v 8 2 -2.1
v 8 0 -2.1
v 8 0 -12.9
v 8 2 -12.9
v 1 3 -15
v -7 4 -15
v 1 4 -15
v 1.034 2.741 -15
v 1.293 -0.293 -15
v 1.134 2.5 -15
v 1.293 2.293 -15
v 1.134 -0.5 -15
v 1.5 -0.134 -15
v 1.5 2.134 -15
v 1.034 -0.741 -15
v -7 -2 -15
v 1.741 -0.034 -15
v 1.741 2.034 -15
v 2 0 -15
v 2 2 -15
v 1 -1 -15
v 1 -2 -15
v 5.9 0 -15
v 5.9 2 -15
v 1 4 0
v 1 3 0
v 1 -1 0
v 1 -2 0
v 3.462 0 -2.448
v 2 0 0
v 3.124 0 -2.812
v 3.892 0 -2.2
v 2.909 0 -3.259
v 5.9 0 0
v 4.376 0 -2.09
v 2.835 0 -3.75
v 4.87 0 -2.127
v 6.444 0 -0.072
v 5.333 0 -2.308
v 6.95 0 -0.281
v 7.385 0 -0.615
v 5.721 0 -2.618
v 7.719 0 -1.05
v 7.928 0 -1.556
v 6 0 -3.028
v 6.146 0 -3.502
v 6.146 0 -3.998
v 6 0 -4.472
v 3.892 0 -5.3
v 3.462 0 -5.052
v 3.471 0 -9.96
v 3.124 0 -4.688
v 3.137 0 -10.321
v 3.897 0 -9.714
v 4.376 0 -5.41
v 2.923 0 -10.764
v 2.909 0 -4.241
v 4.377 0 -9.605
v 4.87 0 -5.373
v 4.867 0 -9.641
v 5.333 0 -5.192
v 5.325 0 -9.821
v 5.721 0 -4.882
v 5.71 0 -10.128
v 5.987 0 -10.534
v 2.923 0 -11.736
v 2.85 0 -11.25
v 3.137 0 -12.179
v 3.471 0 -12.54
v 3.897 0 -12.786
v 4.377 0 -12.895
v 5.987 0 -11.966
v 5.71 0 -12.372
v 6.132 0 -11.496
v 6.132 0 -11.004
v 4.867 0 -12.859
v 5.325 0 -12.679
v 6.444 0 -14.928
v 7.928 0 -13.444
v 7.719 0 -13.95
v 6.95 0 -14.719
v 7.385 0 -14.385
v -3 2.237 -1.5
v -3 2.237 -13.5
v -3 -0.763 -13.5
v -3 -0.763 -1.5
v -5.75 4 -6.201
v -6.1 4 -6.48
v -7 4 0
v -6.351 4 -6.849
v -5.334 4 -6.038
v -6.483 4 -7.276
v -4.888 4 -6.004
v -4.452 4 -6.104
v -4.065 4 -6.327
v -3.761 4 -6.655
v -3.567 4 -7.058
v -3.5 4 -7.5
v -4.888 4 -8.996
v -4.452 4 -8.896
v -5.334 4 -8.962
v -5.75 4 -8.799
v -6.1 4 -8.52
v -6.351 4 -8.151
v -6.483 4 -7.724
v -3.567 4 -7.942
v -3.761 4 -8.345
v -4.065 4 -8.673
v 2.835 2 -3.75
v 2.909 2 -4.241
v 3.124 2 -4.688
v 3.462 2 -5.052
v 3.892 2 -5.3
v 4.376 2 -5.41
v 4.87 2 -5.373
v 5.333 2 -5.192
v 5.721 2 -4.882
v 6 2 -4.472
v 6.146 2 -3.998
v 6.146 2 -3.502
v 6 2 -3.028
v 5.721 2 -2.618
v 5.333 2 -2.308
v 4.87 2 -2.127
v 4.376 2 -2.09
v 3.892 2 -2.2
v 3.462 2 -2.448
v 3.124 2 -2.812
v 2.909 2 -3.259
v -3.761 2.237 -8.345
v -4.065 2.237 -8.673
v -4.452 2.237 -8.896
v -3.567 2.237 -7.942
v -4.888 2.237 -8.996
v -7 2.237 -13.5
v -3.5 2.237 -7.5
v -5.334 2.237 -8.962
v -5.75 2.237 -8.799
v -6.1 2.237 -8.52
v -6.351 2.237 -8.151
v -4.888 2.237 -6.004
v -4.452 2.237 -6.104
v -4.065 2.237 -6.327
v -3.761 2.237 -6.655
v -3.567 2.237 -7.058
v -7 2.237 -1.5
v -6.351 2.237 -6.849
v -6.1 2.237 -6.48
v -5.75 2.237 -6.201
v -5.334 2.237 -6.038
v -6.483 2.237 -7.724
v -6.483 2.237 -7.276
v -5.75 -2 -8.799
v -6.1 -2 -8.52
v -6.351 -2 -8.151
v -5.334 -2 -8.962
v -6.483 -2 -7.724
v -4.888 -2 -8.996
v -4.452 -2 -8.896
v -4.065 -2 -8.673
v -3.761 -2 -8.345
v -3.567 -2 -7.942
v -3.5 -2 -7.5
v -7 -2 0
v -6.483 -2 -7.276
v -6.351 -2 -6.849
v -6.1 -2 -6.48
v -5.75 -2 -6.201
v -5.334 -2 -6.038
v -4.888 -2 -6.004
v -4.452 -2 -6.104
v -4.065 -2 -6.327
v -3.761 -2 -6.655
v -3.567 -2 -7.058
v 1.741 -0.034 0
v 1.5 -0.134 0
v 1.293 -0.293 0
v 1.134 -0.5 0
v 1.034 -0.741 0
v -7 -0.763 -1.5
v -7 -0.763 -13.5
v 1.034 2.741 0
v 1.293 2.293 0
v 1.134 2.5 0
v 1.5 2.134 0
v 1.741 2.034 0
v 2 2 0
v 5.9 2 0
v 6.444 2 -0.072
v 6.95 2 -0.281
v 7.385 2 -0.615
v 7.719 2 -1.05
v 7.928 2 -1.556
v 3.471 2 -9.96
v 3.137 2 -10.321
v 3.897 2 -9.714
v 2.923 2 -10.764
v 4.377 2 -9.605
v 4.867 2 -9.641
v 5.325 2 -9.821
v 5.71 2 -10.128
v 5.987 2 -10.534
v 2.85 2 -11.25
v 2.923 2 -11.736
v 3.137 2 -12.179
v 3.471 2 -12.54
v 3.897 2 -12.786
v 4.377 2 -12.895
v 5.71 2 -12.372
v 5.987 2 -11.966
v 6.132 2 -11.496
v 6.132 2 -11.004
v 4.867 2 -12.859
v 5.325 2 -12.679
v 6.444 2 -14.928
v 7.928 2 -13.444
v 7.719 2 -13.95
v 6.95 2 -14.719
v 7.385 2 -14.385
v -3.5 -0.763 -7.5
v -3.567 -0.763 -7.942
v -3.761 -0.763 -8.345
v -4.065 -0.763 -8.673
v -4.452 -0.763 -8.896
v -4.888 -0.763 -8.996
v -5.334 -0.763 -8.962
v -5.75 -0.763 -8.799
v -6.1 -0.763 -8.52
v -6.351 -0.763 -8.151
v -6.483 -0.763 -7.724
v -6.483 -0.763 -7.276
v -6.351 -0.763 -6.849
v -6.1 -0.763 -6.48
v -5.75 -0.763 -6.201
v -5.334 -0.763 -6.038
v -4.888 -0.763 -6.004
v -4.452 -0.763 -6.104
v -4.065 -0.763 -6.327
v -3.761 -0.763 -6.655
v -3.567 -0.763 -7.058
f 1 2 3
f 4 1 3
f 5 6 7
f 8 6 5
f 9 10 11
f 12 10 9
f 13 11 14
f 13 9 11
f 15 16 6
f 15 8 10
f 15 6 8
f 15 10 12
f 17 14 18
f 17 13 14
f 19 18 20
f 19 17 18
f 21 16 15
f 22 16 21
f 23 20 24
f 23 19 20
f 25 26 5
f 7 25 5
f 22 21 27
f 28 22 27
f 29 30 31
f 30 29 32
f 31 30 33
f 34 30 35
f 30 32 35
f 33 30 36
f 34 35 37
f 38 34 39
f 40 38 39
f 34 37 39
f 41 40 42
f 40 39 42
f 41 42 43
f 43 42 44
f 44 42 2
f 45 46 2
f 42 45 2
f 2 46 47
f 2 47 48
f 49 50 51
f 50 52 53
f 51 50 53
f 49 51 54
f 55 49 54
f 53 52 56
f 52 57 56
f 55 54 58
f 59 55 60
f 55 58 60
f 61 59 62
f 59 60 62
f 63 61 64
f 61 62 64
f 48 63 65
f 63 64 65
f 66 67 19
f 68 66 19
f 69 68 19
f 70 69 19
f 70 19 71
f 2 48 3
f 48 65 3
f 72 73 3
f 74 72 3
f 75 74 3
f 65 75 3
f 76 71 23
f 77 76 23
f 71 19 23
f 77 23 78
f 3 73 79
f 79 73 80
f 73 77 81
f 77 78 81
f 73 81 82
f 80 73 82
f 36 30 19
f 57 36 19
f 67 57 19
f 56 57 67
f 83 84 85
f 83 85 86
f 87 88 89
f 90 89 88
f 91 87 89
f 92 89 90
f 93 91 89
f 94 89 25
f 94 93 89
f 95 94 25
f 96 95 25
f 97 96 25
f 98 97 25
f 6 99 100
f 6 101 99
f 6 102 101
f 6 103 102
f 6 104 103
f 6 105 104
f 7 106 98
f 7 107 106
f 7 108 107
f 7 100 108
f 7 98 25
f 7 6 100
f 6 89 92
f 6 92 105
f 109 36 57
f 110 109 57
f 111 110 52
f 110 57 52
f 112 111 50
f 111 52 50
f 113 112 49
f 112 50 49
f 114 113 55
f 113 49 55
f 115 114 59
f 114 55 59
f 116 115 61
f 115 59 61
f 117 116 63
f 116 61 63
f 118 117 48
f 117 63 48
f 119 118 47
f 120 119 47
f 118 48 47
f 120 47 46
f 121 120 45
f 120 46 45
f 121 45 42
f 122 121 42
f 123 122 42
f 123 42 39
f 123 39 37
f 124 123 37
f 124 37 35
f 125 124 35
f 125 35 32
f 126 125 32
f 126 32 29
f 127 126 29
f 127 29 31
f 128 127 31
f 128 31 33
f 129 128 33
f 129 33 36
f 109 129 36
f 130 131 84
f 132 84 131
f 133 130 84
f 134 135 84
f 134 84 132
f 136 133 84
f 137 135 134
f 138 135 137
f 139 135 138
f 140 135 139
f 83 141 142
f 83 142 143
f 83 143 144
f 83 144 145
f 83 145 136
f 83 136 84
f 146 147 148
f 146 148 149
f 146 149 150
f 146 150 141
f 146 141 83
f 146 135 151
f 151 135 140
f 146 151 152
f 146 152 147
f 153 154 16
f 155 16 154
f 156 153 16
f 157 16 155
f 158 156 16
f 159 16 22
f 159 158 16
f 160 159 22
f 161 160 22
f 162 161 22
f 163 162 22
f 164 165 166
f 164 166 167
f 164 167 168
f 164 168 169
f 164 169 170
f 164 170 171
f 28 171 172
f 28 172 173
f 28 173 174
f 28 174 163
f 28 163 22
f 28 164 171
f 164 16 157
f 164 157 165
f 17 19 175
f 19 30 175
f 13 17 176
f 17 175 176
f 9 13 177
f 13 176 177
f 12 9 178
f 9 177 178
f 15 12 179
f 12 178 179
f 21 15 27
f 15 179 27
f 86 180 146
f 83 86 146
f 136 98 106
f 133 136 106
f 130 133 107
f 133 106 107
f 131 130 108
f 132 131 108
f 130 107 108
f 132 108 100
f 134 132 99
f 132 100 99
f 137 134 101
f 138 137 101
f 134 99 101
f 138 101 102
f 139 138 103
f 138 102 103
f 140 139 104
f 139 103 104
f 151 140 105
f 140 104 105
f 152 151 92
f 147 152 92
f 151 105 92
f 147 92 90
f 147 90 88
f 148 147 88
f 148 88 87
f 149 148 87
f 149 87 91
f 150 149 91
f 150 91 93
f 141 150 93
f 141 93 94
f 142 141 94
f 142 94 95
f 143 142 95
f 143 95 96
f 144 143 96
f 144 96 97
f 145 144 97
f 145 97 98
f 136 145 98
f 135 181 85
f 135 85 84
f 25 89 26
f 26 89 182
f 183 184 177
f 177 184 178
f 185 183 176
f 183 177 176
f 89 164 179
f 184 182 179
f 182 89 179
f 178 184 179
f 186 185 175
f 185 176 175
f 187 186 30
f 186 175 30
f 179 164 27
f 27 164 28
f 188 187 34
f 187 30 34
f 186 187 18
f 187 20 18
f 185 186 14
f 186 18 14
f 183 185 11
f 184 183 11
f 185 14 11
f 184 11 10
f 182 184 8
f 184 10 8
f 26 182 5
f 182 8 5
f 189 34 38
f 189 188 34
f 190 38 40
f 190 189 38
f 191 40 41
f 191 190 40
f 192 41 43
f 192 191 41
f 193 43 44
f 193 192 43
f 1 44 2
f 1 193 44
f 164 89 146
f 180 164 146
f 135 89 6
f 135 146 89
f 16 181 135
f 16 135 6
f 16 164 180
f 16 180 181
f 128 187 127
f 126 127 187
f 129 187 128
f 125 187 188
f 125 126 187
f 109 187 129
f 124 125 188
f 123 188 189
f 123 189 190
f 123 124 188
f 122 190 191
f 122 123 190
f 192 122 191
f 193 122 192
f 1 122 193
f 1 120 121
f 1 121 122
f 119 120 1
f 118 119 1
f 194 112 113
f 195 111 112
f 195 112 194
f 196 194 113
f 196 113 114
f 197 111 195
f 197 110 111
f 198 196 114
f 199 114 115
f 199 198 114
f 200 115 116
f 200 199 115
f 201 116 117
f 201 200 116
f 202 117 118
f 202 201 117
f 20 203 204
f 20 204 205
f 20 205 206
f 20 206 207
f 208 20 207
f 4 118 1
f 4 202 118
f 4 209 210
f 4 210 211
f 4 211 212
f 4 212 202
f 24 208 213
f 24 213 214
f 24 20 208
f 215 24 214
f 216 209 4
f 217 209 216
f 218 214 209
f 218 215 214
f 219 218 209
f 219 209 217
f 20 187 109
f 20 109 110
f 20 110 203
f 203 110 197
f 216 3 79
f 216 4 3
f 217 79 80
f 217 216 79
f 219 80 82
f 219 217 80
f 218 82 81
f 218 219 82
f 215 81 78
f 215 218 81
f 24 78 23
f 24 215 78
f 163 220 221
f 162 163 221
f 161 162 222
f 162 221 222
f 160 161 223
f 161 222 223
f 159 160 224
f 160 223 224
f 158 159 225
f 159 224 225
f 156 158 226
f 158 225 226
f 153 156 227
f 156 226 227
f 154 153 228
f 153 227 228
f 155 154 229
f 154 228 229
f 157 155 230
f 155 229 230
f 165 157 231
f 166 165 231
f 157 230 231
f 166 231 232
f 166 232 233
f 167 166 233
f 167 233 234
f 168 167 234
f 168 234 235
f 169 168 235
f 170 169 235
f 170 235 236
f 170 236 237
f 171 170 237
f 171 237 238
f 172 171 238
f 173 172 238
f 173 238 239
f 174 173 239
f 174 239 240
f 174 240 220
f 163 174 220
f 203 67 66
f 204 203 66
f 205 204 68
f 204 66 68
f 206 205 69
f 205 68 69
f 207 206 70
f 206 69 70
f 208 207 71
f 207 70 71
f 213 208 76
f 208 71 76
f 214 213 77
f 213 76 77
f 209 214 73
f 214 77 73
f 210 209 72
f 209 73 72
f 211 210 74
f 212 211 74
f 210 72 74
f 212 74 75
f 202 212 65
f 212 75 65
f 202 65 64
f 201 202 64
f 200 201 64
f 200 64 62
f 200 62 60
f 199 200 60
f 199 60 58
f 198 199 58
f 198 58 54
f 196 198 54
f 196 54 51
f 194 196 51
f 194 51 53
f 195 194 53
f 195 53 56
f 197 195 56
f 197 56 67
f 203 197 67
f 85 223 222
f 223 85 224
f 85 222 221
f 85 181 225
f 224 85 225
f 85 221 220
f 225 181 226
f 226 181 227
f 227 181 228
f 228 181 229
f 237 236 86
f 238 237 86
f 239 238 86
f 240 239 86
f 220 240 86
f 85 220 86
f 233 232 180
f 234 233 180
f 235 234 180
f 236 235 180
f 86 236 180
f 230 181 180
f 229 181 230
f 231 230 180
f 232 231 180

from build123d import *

# Parameters (mm, degrees)
SKETCH1_W           = 7
SKETCH1_H           = 15
SKETCH1_W_2         = 8
BOSS_EXTRUDE1_DEPTH = 2
SKETCH2_W           = 8
SKETCH2_H           = 15
BOSS_EXTRUDE2_DEPTH = 2
SKETCH3_W           = 8
SKETCH3_H           = 15
BOSS_EXTRUDE4_DEPTH = 2
SKETCH4_R           = 1.665
SKETCH4_R_2         = 1.65
CUT_EXTRUDE1_DEPTH  = 9
FILLET1_R           = 2.1
FILLET2_R           = 2.1
SKETCH5_W           = 12
SKETCH5_H           = 3
CUT_EXTRUDE2_DEPTH  = 3.8
SKETCH6_R           = 1.5
CUT_EXTRUDE3_DEPTH  = 17.2
FILLET3_R           = 1
FILLET4_R           = 1
SKETCH7_W           = 12
SKETCH7_H           = 3
CUT_EXTRUDE4_DEPTH  = 0.2


with BuildPart() as part:
    # Sketch1 → Boss-Extrude1 (new body)
    with BuildSketch(Plane(origin=(0, 0, 0), x_dir=(1, 0, 0), z_dir=(0, 1, 0))):
        with Locations((-3.5, 7.5)):
            Rectangle(SKETCH1_W, SKETCH1_H)
        with Locations((4, 7.5)):
            Rectangle(SKETCH1_W_2, SKETCH1_H)
    extrude(amount=BOSS_EXTRUDE1_DEPTH)

    # Sketch2 → Boss-Extrude2 (add)
    with BuildSketch(Plane.XZ):
        with Locations((-3, -7.5)):
            Rectangle(SKETCH2_W, SKETCH2_H)
    extrude(amount=BOSS_EXTRUDE2_DEPTH)

    # Sketch3 → Boss-Extrude4 (add)
    with BuildSketch(Plane(origin=(0, 2, 0), x_dir=(1, 0, 0), z_dir=(0, 1, 0))):
        with Locations((-3, 7.5)):
            Rectangle(SKETCH3_W, SKETCH3_H)
    extrude(amount=BOSS_EXTRUDE4_DEPTH)

    # Sketch4 → Cut-Extrude1 (cut)
    with BuildSketch(Plane(origin=(0, 0, 0), x_dir=(-1, 0, 0), z_dir=(0, -1, 0))):
        with Locations((-4.5, 3.75)):
            Circle(SKETCH4_R)
        with Locations((-4.5, 11.25)):
            Circle(SKETCH4_R_2)
    extrude(amount=-CUT_EXTRUDE1_DEPTH, mode=Mode.SUBTRACT)

    # Fillet1
    fillet1_edges = [part.edges().sort_by_distance(p)[0] for p in [
        (8, 1, 0),
    ]]
    fillet(fillet1_edges, radius=FILLET1_R)

    # Fillet2
    fillet2_edges = [part.edges().sort_by_distance(p)[0] for p in [
        (8, 1, -15),
    ]]
    fillet(fillet2_edges, radius=FILLET2_R)

    # Sketch5 → Cut-Extrude2 (cut)
    with BuildSketch(Plane.ZY.offset(7)):
        with Locations((-7.5, 0.736813471)):
            Rectangle(SKETCH5_W, SKETCH5_H)
    extrude(amount=-CUT_EXTRUDE2_DEPTH, mode=Mode.SUBTRACT)

    # Sketch6 → Cut-Extrude3 (cut)
    with BuildSketch(Plane(origin=(0, 4, 0), x_dir=(1, 0, 0), z_dir=(0, 1, 0))):
        with Locations((-5, 7.5)):
            Circle(SKETCH6_R)
    extrude(amount=-CUT_EXTRUDE3_DEPTH, mode=Mode.SUBTRACT)

    # Fillet3
    fillet3_edges = [part.edges().sort_by_distance(p)[0] for p in [
        (1, 0, -7.5),
    ]]
    fillet(fillet3_edges, radius=FILLET3_R)

    # Fillet4
    fillet4_edges = [part.edges().sort_by_distance(p)[0] for p in [
        (1, 2, -7.5),
    ]]
    fillet(fillet4_edges, radius=FILLET4_R)

    # Sketch7 → Cut-Extrude4 (cut)
    with BuildSketch(Plane.ZY.offset(3.2)):
        with Locations((-7.5, 0.736813471)):
            Rectangle(SKETCH7_W, SKETCH7_H)
    extrude(amount=-CUT_EXTRUDE4_DEPTH, mode=Mode.SUBTRACT)


solid = part.part
